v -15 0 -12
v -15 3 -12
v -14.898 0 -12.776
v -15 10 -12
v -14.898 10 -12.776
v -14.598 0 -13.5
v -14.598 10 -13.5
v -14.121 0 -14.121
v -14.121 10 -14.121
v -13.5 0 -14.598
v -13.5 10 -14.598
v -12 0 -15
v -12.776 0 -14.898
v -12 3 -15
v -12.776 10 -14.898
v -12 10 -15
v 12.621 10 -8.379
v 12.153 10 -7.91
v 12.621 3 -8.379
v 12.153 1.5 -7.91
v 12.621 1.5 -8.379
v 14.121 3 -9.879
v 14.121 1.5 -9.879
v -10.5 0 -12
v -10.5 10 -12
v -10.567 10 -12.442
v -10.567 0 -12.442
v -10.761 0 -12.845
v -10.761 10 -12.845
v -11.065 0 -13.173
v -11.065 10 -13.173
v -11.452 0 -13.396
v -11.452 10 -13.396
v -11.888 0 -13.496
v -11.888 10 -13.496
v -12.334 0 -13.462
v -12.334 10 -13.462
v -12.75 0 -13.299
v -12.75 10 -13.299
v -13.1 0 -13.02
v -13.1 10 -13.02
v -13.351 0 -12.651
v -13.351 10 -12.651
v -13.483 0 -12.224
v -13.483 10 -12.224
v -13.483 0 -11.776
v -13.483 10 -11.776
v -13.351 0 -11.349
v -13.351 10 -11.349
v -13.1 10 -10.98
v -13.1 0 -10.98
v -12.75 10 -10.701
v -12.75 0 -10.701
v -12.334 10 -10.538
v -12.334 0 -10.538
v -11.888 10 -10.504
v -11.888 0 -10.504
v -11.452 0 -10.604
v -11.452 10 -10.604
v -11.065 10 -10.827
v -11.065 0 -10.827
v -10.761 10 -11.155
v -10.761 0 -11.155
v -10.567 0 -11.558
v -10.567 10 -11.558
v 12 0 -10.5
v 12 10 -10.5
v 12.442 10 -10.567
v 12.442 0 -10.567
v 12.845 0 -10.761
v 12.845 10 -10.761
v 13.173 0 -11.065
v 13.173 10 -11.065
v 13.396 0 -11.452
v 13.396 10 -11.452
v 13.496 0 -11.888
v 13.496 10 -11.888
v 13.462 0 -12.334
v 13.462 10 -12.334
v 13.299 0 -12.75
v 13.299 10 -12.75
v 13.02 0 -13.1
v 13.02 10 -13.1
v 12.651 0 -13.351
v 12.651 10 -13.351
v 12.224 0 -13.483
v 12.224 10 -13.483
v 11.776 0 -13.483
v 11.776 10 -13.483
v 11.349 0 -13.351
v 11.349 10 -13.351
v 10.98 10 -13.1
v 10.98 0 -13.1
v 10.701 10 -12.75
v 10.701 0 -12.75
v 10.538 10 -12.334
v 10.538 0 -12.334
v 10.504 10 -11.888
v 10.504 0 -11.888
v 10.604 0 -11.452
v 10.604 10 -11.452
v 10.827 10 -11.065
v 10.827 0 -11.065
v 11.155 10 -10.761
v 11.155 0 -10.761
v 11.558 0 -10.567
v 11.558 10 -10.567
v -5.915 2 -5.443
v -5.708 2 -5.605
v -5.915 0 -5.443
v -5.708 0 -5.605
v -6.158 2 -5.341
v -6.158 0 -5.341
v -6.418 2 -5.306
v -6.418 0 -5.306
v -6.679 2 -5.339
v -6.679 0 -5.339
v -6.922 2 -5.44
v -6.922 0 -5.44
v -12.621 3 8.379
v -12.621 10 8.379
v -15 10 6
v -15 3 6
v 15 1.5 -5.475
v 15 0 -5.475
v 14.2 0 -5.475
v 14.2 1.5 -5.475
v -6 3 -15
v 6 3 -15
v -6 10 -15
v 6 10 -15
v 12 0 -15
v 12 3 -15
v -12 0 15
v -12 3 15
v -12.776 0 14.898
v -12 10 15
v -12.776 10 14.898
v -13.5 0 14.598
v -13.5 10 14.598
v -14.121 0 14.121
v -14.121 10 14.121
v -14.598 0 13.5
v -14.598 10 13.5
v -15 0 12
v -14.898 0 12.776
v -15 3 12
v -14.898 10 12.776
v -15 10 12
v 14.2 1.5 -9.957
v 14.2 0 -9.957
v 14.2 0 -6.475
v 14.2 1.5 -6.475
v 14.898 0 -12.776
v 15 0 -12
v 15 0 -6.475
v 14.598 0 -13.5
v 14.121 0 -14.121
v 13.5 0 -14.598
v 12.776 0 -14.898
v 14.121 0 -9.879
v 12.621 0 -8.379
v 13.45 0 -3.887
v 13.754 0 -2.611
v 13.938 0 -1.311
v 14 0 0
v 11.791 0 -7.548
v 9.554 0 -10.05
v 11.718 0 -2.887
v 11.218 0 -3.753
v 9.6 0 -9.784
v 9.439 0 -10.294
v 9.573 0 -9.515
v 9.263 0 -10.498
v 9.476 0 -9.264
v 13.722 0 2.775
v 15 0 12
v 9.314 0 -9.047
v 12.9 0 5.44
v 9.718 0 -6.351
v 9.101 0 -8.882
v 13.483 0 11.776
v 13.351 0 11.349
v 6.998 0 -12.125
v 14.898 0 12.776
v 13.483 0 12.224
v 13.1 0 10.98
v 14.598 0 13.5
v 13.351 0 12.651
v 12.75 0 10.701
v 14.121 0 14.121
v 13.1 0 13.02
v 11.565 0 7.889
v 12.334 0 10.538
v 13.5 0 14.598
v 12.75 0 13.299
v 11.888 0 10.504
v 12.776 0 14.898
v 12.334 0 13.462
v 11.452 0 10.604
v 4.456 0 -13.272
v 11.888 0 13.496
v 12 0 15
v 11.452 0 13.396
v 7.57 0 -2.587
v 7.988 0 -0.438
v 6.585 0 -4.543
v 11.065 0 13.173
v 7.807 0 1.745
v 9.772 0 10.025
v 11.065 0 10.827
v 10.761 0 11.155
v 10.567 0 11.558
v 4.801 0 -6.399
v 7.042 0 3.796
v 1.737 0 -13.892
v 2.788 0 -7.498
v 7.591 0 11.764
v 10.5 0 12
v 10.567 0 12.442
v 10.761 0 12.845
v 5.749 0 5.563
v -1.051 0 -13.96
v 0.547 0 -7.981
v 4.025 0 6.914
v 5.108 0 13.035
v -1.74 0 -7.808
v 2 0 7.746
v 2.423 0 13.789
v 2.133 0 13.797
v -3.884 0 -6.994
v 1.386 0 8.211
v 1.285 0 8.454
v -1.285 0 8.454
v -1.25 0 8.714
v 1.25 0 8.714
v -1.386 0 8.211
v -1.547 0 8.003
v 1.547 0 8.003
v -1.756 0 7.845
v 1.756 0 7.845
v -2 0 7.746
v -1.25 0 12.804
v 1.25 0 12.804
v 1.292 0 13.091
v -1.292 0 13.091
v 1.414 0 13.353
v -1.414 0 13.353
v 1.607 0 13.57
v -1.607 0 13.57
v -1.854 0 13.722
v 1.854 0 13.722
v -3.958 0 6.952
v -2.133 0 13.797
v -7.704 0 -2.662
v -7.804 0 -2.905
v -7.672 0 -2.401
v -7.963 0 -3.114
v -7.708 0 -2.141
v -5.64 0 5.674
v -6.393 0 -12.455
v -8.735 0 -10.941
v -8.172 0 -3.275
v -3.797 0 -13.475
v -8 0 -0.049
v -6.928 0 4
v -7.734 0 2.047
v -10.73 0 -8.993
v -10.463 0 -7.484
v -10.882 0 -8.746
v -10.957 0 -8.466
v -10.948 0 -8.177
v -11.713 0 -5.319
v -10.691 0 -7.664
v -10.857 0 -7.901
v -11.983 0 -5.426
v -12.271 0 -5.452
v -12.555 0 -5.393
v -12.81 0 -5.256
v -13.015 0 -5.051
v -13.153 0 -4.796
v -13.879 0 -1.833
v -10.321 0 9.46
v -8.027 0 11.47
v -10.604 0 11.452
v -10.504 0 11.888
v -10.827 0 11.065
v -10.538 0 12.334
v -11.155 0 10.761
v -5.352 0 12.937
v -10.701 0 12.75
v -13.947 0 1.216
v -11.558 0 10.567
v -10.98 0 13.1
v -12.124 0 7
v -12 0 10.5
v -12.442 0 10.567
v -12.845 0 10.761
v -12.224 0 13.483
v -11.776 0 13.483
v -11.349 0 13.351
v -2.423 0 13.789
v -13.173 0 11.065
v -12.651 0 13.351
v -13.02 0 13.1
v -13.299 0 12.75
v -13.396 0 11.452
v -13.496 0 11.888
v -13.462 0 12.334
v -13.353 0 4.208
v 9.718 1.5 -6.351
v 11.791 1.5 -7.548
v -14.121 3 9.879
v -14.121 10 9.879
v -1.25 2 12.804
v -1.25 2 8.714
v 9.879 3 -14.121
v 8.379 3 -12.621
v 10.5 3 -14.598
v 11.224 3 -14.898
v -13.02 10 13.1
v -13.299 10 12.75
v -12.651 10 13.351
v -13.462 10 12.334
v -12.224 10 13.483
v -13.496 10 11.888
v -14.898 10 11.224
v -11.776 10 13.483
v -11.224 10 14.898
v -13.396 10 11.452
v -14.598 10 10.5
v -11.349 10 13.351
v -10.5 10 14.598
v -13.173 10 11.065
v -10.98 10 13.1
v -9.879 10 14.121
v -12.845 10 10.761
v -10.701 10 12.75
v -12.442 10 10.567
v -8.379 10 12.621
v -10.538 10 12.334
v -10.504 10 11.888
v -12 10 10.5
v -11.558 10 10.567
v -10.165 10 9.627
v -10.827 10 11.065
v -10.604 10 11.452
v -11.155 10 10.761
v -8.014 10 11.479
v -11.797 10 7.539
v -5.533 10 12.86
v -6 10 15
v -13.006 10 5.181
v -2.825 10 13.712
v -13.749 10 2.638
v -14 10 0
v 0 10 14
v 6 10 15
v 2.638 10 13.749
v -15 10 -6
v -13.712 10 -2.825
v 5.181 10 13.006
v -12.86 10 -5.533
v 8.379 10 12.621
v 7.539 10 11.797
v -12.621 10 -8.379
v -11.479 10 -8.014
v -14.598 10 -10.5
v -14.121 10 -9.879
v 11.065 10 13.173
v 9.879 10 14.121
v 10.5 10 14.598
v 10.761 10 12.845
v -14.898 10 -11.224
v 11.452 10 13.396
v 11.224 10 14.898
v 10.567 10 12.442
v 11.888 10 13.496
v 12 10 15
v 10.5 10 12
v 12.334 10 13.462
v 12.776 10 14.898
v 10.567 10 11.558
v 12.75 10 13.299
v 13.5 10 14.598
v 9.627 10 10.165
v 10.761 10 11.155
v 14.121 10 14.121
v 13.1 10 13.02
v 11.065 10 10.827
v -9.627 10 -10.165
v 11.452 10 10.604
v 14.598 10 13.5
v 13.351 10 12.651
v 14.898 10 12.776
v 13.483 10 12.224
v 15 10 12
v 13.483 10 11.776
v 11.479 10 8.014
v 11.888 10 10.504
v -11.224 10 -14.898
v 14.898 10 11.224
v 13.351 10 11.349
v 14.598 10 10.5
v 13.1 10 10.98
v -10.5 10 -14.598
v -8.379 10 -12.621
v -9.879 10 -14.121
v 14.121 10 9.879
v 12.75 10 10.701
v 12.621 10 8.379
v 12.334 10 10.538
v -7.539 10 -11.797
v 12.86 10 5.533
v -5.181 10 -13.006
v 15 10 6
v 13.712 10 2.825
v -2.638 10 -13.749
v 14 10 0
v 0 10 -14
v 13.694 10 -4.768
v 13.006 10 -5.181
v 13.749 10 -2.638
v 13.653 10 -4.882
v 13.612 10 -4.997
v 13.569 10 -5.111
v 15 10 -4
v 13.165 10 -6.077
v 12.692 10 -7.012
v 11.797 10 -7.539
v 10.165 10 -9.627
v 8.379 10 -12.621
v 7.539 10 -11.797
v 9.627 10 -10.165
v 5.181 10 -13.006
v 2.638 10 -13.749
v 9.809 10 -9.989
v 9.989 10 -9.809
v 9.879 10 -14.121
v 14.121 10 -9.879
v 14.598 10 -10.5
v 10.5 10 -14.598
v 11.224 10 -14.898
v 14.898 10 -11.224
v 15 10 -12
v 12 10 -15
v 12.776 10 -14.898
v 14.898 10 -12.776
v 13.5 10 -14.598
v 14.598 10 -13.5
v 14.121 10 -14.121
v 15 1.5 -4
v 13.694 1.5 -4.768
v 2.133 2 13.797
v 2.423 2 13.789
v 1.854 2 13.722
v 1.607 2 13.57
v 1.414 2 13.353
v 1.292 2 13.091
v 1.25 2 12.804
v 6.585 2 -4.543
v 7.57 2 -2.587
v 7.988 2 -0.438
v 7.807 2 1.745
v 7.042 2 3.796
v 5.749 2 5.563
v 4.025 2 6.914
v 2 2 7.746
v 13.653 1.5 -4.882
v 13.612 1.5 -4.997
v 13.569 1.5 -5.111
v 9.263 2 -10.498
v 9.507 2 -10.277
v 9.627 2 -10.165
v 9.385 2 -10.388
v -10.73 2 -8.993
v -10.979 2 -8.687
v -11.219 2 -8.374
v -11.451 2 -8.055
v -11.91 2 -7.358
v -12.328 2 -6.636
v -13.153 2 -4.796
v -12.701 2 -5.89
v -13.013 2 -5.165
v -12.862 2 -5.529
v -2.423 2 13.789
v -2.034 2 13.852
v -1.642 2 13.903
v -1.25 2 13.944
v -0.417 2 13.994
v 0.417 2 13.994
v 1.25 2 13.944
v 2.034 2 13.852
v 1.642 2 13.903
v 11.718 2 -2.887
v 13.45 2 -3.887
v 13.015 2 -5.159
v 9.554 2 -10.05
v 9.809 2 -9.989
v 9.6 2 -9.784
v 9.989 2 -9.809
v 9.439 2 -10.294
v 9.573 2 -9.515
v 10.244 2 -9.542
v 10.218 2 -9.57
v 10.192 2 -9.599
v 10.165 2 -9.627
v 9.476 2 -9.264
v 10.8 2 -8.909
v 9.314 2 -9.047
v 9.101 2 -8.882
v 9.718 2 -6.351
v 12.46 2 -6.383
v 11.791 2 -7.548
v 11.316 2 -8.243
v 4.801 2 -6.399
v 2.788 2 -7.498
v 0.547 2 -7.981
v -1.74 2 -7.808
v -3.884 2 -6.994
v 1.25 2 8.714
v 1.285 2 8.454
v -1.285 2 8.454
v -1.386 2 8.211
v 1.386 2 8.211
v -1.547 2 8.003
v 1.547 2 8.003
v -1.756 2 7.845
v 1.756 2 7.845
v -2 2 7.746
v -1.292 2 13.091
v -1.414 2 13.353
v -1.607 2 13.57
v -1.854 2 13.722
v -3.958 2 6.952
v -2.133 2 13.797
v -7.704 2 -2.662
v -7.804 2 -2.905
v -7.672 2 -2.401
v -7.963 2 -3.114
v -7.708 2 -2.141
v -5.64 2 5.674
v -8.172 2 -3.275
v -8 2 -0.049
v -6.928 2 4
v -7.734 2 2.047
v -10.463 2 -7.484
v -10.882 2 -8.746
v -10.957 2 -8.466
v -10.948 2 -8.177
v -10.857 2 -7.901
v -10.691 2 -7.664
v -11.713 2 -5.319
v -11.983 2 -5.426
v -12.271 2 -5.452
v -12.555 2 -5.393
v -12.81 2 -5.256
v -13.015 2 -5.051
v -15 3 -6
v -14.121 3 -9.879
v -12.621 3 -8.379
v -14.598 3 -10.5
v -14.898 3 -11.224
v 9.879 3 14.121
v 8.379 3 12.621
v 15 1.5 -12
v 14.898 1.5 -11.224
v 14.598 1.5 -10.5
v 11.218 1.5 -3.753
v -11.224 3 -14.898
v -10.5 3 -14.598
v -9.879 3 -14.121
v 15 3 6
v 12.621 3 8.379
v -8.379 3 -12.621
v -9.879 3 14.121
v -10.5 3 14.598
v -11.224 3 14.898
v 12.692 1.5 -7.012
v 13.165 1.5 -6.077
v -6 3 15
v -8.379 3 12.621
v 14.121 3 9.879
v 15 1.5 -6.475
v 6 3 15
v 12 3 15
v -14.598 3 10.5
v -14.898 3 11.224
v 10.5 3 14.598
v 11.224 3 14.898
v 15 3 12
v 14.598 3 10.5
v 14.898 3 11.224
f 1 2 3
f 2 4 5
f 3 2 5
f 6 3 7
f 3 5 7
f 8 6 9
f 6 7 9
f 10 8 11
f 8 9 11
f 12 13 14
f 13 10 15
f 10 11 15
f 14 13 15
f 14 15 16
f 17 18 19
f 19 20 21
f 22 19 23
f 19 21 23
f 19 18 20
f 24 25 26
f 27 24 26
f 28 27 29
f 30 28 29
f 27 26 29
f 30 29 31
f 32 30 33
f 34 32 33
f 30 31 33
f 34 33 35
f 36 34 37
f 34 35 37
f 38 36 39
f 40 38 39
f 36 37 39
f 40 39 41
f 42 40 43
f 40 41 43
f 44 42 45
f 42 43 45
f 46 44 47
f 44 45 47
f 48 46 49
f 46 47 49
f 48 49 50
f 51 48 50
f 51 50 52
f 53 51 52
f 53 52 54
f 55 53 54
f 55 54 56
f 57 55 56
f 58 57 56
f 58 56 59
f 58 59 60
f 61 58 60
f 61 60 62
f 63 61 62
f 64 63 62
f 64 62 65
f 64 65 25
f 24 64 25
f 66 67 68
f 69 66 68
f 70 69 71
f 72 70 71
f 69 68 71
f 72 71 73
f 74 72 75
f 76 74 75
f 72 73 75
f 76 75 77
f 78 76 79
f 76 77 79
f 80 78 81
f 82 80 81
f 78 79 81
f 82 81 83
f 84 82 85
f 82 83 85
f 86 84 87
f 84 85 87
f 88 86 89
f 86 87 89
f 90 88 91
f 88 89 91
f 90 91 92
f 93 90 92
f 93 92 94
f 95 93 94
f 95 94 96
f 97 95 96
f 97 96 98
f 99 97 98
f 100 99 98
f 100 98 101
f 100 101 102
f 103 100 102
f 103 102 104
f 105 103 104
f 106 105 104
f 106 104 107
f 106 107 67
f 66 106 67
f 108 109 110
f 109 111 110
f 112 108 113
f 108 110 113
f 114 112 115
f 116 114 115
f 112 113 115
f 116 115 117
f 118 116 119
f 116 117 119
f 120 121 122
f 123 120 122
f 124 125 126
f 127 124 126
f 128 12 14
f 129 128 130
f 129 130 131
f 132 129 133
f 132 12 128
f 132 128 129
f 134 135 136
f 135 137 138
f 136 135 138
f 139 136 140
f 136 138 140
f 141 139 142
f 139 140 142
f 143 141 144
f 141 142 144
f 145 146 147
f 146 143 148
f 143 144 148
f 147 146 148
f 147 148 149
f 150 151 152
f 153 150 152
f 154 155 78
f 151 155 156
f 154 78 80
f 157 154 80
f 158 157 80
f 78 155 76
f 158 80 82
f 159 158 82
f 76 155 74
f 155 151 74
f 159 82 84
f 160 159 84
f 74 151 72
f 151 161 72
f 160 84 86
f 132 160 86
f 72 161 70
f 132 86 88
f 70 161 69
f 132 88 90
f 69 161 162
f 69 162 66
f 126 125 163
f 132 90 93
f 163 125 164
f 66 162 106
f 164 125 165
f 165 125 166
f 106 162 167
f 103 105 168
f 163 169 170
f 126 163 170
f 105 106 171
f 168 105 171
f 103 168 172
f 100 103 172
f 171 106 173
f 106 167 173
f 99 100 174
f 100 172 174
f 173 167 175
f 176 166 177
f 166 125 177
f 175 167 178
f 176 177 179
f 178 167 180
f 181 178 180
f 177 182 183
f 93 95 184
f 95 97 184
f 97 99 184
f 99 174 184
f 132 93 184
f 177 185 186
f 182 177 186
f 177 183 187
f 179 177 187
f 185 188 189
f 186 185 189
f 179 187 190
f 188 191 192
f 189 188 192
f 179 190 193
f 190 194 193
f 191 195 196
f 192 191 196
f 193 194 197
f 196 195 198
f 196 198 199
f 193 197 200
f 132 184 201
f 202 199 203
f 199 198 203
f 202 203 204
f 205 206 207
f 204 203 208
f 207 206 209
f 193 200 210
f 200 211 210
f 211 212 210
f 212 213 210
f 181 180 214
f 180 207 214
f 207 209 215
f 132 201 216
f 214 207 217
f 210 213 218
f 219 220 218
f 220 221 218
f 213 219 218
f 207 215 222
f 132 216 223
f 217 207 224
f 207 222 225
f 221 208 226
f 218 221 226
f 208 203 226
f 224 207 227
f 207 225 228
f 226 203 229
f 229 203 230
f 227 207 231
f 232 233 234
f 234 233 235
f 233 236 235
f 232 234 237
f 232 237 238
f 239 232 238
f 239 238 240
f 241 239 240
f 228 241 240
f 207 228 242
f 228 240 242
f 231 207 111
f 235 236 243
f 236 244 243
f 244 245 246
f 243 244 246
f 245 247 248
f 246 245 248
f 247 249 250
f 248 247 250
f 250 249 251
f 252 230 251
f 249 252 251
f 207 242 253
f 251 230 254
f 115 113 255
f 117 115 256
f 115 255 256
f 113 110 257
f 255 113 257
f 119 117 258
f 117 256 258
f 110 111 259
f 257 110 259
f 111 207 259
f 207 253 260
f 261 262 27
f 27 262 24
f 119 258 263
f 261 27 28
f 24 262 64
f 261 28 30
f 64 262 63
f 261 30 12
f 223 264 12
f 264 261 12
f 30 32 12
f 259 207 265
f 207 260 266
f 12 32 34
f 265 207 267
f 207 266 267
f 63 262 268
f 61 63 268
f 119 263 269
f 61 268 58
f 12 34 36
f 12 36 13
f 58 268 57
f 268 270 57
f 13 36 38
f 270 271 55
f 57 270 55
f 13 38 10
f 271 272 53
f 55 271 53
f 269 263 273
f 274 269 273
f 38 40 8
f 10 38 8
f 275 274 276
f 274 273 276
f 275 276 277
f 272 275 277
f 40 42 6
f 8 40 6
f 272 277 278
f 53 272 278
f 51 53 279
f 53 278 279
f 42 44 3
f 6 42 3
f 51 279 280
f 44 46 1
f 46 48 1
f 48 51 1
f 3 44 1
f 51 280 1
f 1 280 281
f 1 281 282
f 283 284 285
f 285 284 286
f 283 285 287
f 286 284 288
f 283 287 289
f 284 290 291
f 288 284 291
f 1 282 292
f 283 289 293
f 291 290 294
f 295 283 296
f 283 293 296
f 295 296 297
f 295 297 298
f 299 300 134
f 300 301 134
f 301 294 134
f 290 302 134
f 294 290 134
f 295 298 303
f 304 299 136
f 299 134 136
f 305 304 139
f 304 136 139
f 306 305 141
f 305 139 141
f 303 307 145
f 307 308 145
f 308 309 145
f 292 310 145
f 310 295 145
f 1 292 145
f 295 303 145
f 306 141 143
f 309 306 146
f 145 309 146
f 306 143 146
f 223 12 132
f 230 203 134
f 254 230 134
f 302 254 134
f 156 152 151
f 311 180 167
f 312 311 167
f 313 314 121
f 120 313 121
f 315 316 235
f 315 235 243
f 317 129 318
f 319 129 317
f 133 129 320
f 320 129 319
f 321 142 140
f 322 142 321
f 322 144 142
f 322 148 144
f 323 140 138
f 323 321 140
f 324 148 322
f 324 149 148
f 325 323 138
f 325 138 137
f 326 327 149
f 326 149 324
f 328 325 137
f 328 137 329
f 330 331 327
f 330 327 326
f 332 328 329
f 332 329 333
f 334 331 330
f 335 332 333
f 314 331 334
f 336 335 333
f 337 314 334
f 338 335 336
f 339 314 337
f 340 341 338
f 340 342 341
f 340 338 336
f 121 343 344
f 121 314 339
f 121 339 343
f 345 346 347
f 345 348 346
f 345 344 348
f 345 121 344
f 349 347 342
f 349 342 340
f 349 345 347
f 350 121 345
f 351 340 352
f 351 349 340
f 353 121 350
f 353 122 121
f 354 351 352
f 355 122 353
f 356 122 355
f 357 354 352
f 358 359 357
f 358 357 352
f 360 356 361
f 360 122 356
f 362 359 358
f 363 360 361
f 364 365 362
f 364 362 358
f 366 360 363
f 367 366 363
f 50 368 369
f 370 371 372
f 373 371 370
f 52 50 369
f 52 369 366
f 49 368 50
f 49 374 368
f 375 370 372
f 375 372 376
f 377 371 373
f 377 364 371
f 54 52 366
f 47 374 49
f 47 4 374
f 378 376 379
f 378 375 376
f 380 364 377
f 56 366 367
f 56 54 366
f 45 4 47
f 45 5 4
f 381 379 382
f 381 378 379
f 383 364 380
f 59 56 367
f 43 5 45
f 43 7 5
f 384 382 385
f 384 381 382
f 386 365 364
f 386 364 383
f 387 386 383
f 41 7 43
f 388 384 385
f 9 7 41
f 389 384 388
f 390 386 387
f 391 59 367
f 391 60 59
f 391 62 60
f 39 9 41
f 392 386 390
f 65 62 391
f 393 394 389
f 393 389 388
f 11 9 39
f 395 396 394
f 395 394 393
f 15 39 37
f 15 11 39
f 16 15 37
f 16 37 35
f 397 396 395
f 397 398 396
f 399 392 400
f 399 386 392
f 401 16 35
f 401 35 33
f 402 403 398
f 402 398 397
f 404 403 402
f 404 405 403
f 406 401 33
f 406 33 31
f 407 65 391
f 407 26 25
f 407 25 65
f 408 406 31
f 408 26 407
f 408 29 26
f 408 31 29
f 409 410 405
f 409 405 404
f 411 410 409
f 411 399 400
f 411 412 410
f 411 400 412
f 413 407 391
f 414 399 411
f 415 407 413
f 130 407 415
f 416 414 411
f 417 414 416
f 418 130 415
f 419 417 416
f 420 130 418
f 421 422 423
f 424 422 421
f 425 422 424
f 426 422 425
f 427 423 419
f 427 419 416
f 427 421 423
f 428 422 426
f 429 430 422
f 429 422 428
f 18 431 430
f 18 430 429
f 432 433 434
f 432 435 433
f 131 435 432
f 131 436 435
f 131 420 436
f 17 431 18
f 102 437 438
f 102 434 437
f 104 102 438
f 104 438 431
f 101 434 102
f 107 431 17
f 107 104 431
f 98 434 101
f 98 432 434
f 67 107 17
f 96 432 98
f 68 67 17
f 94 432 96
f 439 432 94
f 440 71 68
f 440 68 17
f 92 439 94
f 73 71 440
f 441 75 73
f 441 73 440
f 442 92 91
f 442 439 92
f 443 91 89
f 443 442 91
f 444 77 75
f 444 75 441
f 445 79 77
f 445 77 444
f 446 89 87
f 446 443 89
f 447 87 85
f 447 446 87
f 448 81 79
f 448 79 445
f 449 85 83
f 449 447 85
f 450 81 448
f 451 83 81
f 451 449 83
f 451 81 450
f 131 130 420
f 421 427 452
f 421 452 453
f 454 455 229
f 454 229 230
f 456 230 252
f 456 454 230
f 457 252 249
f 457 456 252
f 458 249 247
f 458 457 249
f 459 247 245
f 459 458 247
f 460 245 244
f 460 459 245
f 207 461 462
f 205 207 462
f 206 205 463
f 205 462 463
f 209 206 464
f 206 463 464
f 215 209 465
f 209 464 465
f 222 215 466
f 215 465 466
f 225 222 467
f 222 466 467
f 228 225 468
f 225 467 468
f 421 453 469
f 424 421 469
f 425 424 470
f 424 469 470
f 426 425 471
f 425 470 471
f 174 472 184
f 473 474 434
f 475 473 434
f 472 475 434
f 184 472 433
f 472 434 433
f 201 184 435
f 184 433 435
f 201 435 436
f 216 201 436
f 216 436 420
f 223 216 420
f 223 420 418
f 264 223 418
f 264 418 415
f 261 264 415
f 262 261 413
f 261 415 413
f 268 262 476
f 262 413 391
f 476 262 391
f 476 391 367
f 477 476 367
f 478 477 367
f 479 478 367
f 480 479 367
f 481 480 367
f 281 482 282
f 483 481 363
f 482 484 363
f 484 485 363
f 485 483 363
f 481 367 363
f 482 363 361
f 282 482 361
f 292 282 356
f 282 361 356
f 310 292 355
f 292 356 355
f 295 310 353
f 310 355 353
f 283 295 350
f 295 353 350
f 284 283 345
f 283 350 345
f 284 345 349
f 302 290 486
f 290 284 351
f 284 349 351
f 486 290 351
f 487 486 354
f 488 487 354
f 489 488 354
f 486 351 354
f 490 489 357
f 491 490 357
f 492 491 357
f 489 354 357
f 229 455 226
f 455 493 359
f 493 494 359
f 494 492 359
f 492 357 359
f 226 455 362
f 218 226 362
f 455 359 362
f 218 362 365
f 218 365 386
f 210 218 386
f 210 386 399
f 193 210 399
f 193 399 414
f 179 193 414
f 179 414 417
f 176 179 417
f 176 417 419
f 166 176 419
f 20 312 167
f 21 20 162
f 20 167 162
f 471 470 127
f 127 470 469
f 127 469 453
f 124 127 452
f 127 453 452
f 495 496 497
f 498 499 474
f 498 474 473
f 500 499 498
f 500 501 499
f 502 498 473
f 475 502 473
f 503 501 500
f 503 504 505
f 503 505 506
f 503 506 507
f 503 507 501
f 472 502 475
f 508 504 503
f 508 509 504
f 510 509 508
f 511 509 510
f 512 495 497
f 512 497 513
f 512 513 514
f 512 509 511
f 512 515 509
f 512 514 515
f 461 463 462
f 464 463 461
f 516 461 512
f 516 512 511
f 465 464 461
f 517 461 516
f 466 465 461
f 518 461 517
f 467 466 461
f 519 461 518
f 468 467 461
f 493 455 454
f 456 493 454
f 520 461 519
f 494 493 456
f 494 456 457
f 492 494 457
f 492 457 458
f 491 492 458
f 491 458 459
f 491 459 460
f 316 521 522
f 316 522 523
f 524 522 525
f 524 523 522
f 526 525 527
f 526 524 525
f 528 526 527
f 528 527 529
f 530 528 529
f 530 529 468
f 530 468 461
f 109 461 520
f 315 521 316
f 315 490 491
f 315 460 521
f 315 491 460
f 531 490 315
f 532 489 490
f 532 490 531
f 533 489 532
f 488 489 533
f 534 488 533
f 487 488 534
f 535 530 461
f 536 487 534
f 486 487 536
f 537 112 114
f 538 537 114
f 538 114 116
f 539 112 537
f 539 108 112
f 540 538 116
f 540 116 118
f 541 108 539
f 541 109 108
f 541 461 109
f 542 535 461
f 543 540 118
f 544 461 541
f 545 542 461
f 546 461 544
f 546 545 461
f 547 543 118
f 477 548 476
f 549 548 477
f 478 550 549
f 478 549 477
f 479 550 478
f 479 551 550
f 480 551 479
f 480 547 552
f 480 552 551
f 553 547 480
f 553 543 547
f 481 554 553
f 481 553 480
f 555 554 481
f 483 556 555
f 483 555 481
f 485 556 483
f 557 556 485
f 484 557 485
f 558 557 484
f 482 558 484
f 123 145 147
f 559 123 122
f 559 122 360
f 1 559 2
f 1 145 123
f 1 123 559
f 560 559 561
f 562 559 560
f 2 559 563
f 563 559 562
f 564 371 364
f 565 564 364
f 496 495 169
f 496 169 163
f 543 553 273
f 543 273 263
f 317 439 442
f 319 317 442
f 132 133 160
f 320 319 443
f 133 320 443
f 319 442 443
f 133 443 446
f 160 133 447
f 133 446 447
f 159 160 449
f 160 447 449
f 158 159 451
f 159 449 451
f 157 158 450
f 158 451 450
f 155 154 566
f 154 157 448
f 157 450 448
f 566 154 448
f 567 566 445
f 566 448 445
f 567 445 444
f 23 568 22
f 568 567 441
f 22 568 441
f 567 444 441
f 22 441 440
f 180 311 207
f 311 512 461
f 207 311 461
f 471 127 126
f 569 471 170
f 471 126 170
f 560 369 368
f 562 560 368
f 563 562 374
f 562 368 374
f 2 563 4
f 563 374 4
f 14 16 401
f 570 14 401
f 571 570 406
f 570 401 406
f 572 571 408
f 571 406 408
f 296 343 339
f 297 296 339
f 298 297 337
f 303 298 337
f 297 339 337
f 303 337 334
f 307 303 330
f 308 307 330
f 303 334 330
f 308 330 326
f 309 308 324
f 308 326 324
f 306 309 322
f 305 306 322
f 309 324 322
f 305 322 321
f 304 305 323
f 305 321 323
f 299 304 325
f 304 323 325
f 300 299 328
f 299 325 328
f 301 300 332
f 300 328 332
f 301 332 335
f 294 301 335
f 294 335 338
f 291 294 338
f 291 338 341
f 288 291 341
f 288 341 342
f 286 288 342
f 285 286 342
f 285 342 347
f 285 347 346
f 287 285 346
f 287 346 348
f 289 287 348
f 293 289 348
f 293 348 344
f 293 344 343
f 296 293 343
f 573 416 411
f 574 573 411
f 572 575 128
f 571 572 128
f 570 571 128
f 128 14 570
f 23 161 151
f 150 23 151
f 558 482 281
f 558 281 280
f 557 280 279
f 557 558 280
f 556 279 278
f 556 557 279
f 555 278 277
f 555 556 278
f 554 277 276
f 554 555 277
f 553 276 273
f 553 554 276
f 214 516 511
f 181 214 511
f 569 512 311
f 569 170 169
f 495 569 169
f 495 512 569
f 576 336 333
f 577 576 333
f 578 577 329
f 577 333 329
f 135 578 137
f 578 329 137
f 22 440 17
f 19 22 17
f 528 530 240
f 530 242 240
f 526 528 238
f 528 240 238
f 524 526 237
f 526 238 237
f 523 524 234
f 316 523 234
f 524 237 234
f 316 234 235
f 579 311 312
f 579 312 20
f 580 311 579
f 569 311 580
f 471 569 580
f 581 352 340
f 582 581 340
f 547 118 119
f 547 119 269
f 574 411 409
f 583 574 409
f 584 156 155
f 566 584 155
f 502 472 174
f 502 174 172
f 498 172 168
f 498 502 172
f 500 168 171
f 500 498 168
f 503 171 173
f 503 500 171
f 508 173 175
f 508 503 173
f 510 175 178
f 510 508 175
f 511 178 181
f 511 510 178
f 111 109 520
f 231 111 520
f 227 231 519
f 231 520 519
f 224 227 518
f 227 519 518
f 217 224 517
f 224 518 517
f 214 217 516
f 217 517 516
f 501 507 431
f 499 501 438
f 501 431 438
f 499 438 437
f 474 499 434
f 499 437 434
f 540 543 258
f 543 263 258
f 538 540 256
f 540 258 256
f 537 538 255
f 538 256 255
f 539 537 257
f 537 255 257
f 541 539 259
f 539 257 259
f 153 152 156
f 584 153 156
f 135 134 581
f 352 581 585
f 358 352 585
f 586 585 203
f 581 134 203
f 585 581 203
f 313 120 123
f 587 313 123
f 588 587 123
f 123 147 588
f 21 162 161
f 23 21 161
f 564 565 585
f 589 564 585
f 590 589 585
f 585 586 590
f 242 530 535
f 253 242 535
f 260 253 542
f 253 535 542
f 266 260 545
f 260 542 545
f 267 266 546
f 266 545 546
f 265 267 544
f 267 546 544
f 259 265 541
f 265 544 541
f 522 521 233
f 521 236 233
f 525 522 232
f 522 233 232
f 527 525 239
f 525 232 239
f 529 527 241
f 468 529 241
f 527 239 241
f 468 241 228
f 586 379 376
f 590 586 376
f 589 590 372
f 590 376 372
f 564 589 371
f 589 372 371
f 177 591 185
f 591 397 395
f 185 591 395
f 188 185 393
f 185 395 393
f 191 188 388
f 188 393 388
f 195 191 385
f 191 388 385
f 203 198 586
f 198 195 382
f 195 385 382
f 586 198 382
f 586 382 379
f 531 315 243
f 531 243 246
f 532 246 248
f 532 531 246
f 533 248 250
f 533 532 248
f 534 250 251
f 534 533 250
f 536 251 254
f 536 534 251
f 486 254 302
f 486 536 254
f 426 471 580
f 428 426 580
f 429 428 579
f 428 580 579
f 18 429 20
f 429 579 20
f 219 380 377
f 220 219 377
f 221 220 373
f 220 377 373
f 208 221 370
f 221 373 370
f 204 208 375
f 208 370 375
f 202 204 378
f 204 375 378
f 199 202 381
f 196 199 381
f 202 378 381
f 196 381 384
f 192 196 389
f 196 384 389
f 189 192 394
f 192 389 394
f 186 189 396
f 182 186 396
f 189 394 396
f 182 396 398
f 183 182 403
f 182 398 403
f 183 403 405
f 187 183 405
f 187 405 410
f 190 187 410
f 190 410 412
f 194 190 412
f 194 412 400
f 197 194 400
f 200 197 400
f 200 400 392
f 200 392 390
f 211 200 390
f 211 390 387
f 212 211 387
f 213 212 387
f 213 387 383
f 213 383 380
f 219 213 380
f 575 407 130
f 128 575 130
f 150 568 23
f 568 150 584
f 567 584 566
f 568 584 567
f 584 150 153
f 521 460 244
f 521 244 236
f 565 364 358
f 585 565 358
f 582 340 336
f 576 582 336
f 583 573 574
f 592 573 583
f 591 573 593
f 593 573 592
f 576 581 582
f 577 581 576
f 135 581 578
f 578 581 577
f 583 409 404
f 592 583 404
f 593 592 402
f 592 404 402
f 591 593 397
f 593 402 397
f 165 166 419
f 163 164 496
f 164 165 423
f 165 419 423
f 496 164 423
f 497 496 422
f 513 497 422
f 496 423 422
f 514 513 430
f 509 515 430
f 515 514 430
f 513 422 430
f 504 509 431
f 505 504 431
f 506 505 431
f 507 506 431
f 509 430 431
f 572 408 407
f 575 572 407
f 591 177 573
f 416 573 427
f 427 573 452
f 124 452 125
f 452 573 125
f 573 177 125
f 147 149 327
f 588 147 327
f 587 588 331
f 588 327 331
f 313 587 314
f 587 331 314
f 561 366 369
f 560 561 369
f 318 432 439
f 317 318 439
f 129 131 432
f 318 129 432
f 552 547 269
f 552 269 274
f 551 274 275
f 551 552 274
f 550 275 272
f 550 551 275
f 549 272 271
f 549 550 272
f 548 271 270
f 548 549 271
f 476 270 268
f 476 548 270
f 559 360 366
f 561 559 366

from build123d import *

# Parameters (mm, degrees)
SKETCH2_W           = 30
SKETCH2_H           = 30
BOSS_EXTRUDE1_DEPTH = 10
SKETCH3_R           = 1.5
CUT_EXTRUDE1_DEPTH  = 24.452078799
CUT_EXTRUDE5_DEPTH  = 7
CIRPATTERN2_COUNT   = 4
BOSS_EXTRUDE2_START = -2
SKETCH5_R           = 8
BOSS_EXTRUDE2_DEPTH = 2
BOSS_EXTRUDE3_START = -2
BOSS_EXTRUDE3_DEPTH = 2
FILLET1_R           = 1
FILLET2_R           = 1
CUT_EXTRUDE8_DEPTH  = 1.5
CUT_EXTRUDE9_DEPTH  = 23.852789764


with BuildPart() as part:
    # Sketch2 → Boss-Extrude1 (new body)
    with BuildSketch(Plane(origin=(0, 0, 0), x_dir=(1, 0, 0), z_dir=(0, 1, 0))):
        Rectangle(SKETCH2_W, SKETCH2_H)
    extrude(amount=BOSS_EXTRUDE1_DEPTH)

    # Sketch3 → Cut-Extrude1 (cut, through all)
    with BuildSketch(Plane(origin=(0, 10, 0), x_dir=(1, 0, 0), z_dir=(0, 1, 0))):
        with BuildLine():
            ThreePointArc((9.626607334, 10.165059333), (-12.860258603, -5.532969245), (14, 0))
            ThreePointArc((14, 0), (13.005976139, 5.181175993), (10.165059333, 9.626607334))
            ThreePointArc((10.165059333, 9.626607334), (9.878679656, 9.878679656), (9.626607334, 10.165059333))
        make_face()
        with BuildLine():
            Line((15, 15), (12, 15))
            ThreePointArc((12, 15), (14.121320344, 14.121320344), (15, 12))
            Line((15, 12), (15, 15))
        make_face()
        with Locations(Location((12, 12, 0), (0, 0, 270))):
            Circle(SKETCH3_R)
    cut_extrude1 = extrude(amount=-CUT_EXTRUDE1_DEPTH, mode=Mode.SUBTRACT)

    # Sketch3<3> → Cut-Extrude5 (cut)
    with BuildSketch(Plane(origin=(0, 10, 0), x_dir=(1, 0, 0), z_dir=(0, 1, 0))):
        with BuildLine():
            Line((15, 6), (15, 12))
            ThreePointArc((15, 12), (14.771638598, 10.851949703), (14.121320344, 9.878679656))
            Line((14.121320344, 9.878679656), (12.621320344, 8.378679656))
            Line((12.621320344, 8.378679656), (15, 6))
        make_face()
        with BuildLine():
            Line((8.378679656, 12.621320344), (9.878679656, 14.121320344))
            ThreePointArc((9.878679656, 14.121320344), (10.851949703, 14.771638598), (12, 15))
            Line((12, 15), (6, 15))
            Line((6, 15), (8.378679656, 12.621320344))
        make_face()
    cut_extrude5 = extrude(amount=-CUT_EXTRUDE5_DEPTH, mode=Mode.SUBTRACT)

    # CirPattern2: Cut-Extrude1, Cut-Extrude5 ×4 about axis
    cirpattern2_axis = Axis((0, 0, 0), (0, 1, 0))
    add([cut_extrude1.rotate(cirpattern2_axis, i * 360 / CIRPATTERN2_COUNT) for i in range(1, CIRPATTERN2_COUNT)], mode=Mode.SUBTRACT)
    add([cut_extrude5.rotate(cirpattern2_axis, i * 360 / CIRPATTERN2_COUNT) for i in range(1, CIRPATTERN2_COUNT)], mode=Mode.SUBTRACT)

    # Sketch5 → Boss-Extrude2 (add)
    with BuildSketch(Plane.XZ.offset(BOSS_EXTRUDE2_START)):
        Circle(SKETCH5_R)
        with BuildLine():
            Line((-1.25, 7.901740315), (-1.25, 13.944084767))
            ThreePointArc((-1.25, 13.944084767), (0, 14), (1.25, 13.944084767))
            Line((1.25, 13.944084767), (1.25, 7.901740315))
            Line((1.25, 7.901740315), (-1.25, 7.901740315))
        make_face()
        with BuildLine():
            Line((-6.218107847, -5.033401912), (-11.450931641, -8.054574138))
            ThreePointArc((-11.450931641, -8.054574138), (-12.124355653, -7), (-12.700931641, -5.889510629))
            Line((-12.700931641, -5.889510629), (-7.468107847, -2.868338403))
            Line((-7.468107847, -2.868338403), (-6.218107847, -5.033401912))
        make_face()
        with BuildLine():
            Line((4.800907132, -6.399319551), (10.244405826, -9.542124987))
            ThreePointArc((10.244405826, -9.542124987), (11.062646674, -8.580084415), (11.790860146, -7.548219459))
            Line((11.790860146, -7.548219459), (6.585131773, -4.542690781))
            Line((6.585131773, -4.542690781), (4.800907132, -6.399319551))
        make_face()
    extrude(amount=BOSS_EXTRUDE2_DEPTH)

    # Sketch13 → Boss-Extrude3 (add)
    with BuildSketch(Plane.XZ.offset(BOSS_EXTRUDE3_START)):
        with BuildLine():
            Line((8.467510381, -8.516233923), (11.717510381, -2.887068799))
            Line((11.717510381, -2.887068799), (13.449561188, -3.887068799))
            ThreePointArc((13.449561188, -3.887068799), (12.179734535, -6.903192498), (10.244405826, -9.542124987))
            Line((10.244405826, -9.542124987), (8.467510381, -8.516233923))
        make_face()
    extrude(amount=BOSS_EXTRUDE3_DEPTH)

    # Fillet1
    # the kernel refuses this fillet: 1 mm, written as the material it adds along each edge
    with BuildSketch(Plane(origin=(10.244405826, 2, -9.542124987), x_dir=(-0.716571272890301, 0, -0.6975138786206146), z_dir=(0, -1, 0))) as fillet1_piece_1:
        with BuildLine():
            CenterArc((1.321230175, -0.998801992), FILLET1_R, 87.19514232, 108.576976785)
            Line((0.3588798, -1.270613979), (0, 0))
            ThreePointArc((0, 0), (0.685082313, 0.01677211), (1.370164625, 0))
        make_face()
    extrude(amount=2)
    with BuildSketch(Plane(origin=(-1.25, 2, 13.944084767), x_dir=(0, 0, -1), z_dir=(0, -1, 0)), Plane(origin=(-11.450931641, 2, -8.054574138), x_dir=(0.8660254037844306, 0, 0.5000000000000138), z_dir=(0, -1, 0))) as fillet1_piece_2:
        with BuildLine():
            CenterArc((1.14027674, -1), FILLET1_R, 90, 99.9667663)
            ThreePointArc((0.15536843, -1.173076923), (0.065284688, -0.58818072), (0, 0))
            Line((0, 0), (1.14027674, 0))
        make_face()
    extrude(amount=2)
    with BuildSketch(Plane(origin=(-12.700931641, 2, -5.889510629), x_dir=(0.8660254037844369, 0, 0.5000000000000029), z_dir=(0, -1, 0)), Plane(origin=(1.25, 2, 13.944084767), x_dir=(0, 0, -1), z_dir=(0, -1, 0))) as fillet1_piece_3:
        with BuildLine():
            CenterArc((1.14027674, 1), FILLET1_R, 170.0332337, 99.9667663)
            ThreePointArc((0.15536843, 1.173076923), (0.065284688, 0.58818072), (0, 0))
            Line((0, 0), (1.14027674, 0))
        make_face()
    extrude(amount=2)

    # Fillet2
    fillet2_edges = [part.edges().sort_by_distance(p)[0] for p in [
        (-7.468107847, 1, -2.868338403),
        (1.25, 1, 7.901740315),
        (-1.25, 1, 7.901740315),
        (-6.218107847, 1, -5.033401912),
    ]]
    fillet(fillet2_edges, radius=FILLET2_R)

    # Sketch9 → Cut-Extrude8 (cut)
    with BuildSketch(Plane.XZ):
        Polygon((9.717510381, -6.351170414), (11.790860146, -7.548219459), (12.621320344, -8.378679656), (14.121320344, -9.878679656), (14.2, -9.957359313), (14.2, -6.475035387), (15, -6.475035387), (15, -5.475035387), (14.2, -5.475035387), (11.217510381, -3.753094203), align=None)
    extrude(amount=-CUT_EXTRUDE8_DEPTH, mode=Mode.SUBTRACT)

    # Sketch10 → Cut-Extrude9 (cut, through all)
    with BuildSketch(Plane.XZ.offset(-1.5)):
        with BuildLine():
            ThreePointArc((13.569384529, -5.110949375), (12.93687053, -6.548845767), (12.152521667, -7.90988098))
            Line((12.152521667, -7.90988098), (14.121320344, -9.878679656))
            Line((14.121320344, -9.878679656), (14.2, -9.957359313))
            Line((14.2, -9.957359313), (14.2, -6.475035387))
            Line((14.2, -6.475035387), (15, -6.475035387))
            Line((15, -6.475035387), (15, -5.475035387))
            Line((15, -5.475035387), (14.2, -5.475035387))
            Line((14.2, -5.475035387), (13.569384529, -5.110949375))
        make_face()
        with BuildLine():
            ThreePointArc((13.693819896, -4.767525213), (13.632683665, -4.939629144), (13.569384529, -5.110949375))
            Line((13.569384529, -5.110949375), (14.2, -5.475035387))
            Line((14.2, -5.475035387), (15, -5.475035387))
            Line((15, -5.475035387), (15, -4))
            Line((15, -4), (13.693819896, -4.767525213))
        make_face()
        with BuildLine():
            Line((14.2, -9.957359313), (14.121320344, -9.878679656))
            ThreePointArc((14.121320344, -9.878679656), (14.771638598, -10.851949703), (15, -12))
            Line((15, -12), (15, -6.475035387))
            Line((15, -6.475035387), (14.2, -6.475035387))
            Line((14.2, -6.475035387), (14.2, -9.957359313))
        make_face()
    extrude(amount=-CUT_EXTRUDE9_DEPTH, mode=Mode.SUBTRACT)


solid = part.part
